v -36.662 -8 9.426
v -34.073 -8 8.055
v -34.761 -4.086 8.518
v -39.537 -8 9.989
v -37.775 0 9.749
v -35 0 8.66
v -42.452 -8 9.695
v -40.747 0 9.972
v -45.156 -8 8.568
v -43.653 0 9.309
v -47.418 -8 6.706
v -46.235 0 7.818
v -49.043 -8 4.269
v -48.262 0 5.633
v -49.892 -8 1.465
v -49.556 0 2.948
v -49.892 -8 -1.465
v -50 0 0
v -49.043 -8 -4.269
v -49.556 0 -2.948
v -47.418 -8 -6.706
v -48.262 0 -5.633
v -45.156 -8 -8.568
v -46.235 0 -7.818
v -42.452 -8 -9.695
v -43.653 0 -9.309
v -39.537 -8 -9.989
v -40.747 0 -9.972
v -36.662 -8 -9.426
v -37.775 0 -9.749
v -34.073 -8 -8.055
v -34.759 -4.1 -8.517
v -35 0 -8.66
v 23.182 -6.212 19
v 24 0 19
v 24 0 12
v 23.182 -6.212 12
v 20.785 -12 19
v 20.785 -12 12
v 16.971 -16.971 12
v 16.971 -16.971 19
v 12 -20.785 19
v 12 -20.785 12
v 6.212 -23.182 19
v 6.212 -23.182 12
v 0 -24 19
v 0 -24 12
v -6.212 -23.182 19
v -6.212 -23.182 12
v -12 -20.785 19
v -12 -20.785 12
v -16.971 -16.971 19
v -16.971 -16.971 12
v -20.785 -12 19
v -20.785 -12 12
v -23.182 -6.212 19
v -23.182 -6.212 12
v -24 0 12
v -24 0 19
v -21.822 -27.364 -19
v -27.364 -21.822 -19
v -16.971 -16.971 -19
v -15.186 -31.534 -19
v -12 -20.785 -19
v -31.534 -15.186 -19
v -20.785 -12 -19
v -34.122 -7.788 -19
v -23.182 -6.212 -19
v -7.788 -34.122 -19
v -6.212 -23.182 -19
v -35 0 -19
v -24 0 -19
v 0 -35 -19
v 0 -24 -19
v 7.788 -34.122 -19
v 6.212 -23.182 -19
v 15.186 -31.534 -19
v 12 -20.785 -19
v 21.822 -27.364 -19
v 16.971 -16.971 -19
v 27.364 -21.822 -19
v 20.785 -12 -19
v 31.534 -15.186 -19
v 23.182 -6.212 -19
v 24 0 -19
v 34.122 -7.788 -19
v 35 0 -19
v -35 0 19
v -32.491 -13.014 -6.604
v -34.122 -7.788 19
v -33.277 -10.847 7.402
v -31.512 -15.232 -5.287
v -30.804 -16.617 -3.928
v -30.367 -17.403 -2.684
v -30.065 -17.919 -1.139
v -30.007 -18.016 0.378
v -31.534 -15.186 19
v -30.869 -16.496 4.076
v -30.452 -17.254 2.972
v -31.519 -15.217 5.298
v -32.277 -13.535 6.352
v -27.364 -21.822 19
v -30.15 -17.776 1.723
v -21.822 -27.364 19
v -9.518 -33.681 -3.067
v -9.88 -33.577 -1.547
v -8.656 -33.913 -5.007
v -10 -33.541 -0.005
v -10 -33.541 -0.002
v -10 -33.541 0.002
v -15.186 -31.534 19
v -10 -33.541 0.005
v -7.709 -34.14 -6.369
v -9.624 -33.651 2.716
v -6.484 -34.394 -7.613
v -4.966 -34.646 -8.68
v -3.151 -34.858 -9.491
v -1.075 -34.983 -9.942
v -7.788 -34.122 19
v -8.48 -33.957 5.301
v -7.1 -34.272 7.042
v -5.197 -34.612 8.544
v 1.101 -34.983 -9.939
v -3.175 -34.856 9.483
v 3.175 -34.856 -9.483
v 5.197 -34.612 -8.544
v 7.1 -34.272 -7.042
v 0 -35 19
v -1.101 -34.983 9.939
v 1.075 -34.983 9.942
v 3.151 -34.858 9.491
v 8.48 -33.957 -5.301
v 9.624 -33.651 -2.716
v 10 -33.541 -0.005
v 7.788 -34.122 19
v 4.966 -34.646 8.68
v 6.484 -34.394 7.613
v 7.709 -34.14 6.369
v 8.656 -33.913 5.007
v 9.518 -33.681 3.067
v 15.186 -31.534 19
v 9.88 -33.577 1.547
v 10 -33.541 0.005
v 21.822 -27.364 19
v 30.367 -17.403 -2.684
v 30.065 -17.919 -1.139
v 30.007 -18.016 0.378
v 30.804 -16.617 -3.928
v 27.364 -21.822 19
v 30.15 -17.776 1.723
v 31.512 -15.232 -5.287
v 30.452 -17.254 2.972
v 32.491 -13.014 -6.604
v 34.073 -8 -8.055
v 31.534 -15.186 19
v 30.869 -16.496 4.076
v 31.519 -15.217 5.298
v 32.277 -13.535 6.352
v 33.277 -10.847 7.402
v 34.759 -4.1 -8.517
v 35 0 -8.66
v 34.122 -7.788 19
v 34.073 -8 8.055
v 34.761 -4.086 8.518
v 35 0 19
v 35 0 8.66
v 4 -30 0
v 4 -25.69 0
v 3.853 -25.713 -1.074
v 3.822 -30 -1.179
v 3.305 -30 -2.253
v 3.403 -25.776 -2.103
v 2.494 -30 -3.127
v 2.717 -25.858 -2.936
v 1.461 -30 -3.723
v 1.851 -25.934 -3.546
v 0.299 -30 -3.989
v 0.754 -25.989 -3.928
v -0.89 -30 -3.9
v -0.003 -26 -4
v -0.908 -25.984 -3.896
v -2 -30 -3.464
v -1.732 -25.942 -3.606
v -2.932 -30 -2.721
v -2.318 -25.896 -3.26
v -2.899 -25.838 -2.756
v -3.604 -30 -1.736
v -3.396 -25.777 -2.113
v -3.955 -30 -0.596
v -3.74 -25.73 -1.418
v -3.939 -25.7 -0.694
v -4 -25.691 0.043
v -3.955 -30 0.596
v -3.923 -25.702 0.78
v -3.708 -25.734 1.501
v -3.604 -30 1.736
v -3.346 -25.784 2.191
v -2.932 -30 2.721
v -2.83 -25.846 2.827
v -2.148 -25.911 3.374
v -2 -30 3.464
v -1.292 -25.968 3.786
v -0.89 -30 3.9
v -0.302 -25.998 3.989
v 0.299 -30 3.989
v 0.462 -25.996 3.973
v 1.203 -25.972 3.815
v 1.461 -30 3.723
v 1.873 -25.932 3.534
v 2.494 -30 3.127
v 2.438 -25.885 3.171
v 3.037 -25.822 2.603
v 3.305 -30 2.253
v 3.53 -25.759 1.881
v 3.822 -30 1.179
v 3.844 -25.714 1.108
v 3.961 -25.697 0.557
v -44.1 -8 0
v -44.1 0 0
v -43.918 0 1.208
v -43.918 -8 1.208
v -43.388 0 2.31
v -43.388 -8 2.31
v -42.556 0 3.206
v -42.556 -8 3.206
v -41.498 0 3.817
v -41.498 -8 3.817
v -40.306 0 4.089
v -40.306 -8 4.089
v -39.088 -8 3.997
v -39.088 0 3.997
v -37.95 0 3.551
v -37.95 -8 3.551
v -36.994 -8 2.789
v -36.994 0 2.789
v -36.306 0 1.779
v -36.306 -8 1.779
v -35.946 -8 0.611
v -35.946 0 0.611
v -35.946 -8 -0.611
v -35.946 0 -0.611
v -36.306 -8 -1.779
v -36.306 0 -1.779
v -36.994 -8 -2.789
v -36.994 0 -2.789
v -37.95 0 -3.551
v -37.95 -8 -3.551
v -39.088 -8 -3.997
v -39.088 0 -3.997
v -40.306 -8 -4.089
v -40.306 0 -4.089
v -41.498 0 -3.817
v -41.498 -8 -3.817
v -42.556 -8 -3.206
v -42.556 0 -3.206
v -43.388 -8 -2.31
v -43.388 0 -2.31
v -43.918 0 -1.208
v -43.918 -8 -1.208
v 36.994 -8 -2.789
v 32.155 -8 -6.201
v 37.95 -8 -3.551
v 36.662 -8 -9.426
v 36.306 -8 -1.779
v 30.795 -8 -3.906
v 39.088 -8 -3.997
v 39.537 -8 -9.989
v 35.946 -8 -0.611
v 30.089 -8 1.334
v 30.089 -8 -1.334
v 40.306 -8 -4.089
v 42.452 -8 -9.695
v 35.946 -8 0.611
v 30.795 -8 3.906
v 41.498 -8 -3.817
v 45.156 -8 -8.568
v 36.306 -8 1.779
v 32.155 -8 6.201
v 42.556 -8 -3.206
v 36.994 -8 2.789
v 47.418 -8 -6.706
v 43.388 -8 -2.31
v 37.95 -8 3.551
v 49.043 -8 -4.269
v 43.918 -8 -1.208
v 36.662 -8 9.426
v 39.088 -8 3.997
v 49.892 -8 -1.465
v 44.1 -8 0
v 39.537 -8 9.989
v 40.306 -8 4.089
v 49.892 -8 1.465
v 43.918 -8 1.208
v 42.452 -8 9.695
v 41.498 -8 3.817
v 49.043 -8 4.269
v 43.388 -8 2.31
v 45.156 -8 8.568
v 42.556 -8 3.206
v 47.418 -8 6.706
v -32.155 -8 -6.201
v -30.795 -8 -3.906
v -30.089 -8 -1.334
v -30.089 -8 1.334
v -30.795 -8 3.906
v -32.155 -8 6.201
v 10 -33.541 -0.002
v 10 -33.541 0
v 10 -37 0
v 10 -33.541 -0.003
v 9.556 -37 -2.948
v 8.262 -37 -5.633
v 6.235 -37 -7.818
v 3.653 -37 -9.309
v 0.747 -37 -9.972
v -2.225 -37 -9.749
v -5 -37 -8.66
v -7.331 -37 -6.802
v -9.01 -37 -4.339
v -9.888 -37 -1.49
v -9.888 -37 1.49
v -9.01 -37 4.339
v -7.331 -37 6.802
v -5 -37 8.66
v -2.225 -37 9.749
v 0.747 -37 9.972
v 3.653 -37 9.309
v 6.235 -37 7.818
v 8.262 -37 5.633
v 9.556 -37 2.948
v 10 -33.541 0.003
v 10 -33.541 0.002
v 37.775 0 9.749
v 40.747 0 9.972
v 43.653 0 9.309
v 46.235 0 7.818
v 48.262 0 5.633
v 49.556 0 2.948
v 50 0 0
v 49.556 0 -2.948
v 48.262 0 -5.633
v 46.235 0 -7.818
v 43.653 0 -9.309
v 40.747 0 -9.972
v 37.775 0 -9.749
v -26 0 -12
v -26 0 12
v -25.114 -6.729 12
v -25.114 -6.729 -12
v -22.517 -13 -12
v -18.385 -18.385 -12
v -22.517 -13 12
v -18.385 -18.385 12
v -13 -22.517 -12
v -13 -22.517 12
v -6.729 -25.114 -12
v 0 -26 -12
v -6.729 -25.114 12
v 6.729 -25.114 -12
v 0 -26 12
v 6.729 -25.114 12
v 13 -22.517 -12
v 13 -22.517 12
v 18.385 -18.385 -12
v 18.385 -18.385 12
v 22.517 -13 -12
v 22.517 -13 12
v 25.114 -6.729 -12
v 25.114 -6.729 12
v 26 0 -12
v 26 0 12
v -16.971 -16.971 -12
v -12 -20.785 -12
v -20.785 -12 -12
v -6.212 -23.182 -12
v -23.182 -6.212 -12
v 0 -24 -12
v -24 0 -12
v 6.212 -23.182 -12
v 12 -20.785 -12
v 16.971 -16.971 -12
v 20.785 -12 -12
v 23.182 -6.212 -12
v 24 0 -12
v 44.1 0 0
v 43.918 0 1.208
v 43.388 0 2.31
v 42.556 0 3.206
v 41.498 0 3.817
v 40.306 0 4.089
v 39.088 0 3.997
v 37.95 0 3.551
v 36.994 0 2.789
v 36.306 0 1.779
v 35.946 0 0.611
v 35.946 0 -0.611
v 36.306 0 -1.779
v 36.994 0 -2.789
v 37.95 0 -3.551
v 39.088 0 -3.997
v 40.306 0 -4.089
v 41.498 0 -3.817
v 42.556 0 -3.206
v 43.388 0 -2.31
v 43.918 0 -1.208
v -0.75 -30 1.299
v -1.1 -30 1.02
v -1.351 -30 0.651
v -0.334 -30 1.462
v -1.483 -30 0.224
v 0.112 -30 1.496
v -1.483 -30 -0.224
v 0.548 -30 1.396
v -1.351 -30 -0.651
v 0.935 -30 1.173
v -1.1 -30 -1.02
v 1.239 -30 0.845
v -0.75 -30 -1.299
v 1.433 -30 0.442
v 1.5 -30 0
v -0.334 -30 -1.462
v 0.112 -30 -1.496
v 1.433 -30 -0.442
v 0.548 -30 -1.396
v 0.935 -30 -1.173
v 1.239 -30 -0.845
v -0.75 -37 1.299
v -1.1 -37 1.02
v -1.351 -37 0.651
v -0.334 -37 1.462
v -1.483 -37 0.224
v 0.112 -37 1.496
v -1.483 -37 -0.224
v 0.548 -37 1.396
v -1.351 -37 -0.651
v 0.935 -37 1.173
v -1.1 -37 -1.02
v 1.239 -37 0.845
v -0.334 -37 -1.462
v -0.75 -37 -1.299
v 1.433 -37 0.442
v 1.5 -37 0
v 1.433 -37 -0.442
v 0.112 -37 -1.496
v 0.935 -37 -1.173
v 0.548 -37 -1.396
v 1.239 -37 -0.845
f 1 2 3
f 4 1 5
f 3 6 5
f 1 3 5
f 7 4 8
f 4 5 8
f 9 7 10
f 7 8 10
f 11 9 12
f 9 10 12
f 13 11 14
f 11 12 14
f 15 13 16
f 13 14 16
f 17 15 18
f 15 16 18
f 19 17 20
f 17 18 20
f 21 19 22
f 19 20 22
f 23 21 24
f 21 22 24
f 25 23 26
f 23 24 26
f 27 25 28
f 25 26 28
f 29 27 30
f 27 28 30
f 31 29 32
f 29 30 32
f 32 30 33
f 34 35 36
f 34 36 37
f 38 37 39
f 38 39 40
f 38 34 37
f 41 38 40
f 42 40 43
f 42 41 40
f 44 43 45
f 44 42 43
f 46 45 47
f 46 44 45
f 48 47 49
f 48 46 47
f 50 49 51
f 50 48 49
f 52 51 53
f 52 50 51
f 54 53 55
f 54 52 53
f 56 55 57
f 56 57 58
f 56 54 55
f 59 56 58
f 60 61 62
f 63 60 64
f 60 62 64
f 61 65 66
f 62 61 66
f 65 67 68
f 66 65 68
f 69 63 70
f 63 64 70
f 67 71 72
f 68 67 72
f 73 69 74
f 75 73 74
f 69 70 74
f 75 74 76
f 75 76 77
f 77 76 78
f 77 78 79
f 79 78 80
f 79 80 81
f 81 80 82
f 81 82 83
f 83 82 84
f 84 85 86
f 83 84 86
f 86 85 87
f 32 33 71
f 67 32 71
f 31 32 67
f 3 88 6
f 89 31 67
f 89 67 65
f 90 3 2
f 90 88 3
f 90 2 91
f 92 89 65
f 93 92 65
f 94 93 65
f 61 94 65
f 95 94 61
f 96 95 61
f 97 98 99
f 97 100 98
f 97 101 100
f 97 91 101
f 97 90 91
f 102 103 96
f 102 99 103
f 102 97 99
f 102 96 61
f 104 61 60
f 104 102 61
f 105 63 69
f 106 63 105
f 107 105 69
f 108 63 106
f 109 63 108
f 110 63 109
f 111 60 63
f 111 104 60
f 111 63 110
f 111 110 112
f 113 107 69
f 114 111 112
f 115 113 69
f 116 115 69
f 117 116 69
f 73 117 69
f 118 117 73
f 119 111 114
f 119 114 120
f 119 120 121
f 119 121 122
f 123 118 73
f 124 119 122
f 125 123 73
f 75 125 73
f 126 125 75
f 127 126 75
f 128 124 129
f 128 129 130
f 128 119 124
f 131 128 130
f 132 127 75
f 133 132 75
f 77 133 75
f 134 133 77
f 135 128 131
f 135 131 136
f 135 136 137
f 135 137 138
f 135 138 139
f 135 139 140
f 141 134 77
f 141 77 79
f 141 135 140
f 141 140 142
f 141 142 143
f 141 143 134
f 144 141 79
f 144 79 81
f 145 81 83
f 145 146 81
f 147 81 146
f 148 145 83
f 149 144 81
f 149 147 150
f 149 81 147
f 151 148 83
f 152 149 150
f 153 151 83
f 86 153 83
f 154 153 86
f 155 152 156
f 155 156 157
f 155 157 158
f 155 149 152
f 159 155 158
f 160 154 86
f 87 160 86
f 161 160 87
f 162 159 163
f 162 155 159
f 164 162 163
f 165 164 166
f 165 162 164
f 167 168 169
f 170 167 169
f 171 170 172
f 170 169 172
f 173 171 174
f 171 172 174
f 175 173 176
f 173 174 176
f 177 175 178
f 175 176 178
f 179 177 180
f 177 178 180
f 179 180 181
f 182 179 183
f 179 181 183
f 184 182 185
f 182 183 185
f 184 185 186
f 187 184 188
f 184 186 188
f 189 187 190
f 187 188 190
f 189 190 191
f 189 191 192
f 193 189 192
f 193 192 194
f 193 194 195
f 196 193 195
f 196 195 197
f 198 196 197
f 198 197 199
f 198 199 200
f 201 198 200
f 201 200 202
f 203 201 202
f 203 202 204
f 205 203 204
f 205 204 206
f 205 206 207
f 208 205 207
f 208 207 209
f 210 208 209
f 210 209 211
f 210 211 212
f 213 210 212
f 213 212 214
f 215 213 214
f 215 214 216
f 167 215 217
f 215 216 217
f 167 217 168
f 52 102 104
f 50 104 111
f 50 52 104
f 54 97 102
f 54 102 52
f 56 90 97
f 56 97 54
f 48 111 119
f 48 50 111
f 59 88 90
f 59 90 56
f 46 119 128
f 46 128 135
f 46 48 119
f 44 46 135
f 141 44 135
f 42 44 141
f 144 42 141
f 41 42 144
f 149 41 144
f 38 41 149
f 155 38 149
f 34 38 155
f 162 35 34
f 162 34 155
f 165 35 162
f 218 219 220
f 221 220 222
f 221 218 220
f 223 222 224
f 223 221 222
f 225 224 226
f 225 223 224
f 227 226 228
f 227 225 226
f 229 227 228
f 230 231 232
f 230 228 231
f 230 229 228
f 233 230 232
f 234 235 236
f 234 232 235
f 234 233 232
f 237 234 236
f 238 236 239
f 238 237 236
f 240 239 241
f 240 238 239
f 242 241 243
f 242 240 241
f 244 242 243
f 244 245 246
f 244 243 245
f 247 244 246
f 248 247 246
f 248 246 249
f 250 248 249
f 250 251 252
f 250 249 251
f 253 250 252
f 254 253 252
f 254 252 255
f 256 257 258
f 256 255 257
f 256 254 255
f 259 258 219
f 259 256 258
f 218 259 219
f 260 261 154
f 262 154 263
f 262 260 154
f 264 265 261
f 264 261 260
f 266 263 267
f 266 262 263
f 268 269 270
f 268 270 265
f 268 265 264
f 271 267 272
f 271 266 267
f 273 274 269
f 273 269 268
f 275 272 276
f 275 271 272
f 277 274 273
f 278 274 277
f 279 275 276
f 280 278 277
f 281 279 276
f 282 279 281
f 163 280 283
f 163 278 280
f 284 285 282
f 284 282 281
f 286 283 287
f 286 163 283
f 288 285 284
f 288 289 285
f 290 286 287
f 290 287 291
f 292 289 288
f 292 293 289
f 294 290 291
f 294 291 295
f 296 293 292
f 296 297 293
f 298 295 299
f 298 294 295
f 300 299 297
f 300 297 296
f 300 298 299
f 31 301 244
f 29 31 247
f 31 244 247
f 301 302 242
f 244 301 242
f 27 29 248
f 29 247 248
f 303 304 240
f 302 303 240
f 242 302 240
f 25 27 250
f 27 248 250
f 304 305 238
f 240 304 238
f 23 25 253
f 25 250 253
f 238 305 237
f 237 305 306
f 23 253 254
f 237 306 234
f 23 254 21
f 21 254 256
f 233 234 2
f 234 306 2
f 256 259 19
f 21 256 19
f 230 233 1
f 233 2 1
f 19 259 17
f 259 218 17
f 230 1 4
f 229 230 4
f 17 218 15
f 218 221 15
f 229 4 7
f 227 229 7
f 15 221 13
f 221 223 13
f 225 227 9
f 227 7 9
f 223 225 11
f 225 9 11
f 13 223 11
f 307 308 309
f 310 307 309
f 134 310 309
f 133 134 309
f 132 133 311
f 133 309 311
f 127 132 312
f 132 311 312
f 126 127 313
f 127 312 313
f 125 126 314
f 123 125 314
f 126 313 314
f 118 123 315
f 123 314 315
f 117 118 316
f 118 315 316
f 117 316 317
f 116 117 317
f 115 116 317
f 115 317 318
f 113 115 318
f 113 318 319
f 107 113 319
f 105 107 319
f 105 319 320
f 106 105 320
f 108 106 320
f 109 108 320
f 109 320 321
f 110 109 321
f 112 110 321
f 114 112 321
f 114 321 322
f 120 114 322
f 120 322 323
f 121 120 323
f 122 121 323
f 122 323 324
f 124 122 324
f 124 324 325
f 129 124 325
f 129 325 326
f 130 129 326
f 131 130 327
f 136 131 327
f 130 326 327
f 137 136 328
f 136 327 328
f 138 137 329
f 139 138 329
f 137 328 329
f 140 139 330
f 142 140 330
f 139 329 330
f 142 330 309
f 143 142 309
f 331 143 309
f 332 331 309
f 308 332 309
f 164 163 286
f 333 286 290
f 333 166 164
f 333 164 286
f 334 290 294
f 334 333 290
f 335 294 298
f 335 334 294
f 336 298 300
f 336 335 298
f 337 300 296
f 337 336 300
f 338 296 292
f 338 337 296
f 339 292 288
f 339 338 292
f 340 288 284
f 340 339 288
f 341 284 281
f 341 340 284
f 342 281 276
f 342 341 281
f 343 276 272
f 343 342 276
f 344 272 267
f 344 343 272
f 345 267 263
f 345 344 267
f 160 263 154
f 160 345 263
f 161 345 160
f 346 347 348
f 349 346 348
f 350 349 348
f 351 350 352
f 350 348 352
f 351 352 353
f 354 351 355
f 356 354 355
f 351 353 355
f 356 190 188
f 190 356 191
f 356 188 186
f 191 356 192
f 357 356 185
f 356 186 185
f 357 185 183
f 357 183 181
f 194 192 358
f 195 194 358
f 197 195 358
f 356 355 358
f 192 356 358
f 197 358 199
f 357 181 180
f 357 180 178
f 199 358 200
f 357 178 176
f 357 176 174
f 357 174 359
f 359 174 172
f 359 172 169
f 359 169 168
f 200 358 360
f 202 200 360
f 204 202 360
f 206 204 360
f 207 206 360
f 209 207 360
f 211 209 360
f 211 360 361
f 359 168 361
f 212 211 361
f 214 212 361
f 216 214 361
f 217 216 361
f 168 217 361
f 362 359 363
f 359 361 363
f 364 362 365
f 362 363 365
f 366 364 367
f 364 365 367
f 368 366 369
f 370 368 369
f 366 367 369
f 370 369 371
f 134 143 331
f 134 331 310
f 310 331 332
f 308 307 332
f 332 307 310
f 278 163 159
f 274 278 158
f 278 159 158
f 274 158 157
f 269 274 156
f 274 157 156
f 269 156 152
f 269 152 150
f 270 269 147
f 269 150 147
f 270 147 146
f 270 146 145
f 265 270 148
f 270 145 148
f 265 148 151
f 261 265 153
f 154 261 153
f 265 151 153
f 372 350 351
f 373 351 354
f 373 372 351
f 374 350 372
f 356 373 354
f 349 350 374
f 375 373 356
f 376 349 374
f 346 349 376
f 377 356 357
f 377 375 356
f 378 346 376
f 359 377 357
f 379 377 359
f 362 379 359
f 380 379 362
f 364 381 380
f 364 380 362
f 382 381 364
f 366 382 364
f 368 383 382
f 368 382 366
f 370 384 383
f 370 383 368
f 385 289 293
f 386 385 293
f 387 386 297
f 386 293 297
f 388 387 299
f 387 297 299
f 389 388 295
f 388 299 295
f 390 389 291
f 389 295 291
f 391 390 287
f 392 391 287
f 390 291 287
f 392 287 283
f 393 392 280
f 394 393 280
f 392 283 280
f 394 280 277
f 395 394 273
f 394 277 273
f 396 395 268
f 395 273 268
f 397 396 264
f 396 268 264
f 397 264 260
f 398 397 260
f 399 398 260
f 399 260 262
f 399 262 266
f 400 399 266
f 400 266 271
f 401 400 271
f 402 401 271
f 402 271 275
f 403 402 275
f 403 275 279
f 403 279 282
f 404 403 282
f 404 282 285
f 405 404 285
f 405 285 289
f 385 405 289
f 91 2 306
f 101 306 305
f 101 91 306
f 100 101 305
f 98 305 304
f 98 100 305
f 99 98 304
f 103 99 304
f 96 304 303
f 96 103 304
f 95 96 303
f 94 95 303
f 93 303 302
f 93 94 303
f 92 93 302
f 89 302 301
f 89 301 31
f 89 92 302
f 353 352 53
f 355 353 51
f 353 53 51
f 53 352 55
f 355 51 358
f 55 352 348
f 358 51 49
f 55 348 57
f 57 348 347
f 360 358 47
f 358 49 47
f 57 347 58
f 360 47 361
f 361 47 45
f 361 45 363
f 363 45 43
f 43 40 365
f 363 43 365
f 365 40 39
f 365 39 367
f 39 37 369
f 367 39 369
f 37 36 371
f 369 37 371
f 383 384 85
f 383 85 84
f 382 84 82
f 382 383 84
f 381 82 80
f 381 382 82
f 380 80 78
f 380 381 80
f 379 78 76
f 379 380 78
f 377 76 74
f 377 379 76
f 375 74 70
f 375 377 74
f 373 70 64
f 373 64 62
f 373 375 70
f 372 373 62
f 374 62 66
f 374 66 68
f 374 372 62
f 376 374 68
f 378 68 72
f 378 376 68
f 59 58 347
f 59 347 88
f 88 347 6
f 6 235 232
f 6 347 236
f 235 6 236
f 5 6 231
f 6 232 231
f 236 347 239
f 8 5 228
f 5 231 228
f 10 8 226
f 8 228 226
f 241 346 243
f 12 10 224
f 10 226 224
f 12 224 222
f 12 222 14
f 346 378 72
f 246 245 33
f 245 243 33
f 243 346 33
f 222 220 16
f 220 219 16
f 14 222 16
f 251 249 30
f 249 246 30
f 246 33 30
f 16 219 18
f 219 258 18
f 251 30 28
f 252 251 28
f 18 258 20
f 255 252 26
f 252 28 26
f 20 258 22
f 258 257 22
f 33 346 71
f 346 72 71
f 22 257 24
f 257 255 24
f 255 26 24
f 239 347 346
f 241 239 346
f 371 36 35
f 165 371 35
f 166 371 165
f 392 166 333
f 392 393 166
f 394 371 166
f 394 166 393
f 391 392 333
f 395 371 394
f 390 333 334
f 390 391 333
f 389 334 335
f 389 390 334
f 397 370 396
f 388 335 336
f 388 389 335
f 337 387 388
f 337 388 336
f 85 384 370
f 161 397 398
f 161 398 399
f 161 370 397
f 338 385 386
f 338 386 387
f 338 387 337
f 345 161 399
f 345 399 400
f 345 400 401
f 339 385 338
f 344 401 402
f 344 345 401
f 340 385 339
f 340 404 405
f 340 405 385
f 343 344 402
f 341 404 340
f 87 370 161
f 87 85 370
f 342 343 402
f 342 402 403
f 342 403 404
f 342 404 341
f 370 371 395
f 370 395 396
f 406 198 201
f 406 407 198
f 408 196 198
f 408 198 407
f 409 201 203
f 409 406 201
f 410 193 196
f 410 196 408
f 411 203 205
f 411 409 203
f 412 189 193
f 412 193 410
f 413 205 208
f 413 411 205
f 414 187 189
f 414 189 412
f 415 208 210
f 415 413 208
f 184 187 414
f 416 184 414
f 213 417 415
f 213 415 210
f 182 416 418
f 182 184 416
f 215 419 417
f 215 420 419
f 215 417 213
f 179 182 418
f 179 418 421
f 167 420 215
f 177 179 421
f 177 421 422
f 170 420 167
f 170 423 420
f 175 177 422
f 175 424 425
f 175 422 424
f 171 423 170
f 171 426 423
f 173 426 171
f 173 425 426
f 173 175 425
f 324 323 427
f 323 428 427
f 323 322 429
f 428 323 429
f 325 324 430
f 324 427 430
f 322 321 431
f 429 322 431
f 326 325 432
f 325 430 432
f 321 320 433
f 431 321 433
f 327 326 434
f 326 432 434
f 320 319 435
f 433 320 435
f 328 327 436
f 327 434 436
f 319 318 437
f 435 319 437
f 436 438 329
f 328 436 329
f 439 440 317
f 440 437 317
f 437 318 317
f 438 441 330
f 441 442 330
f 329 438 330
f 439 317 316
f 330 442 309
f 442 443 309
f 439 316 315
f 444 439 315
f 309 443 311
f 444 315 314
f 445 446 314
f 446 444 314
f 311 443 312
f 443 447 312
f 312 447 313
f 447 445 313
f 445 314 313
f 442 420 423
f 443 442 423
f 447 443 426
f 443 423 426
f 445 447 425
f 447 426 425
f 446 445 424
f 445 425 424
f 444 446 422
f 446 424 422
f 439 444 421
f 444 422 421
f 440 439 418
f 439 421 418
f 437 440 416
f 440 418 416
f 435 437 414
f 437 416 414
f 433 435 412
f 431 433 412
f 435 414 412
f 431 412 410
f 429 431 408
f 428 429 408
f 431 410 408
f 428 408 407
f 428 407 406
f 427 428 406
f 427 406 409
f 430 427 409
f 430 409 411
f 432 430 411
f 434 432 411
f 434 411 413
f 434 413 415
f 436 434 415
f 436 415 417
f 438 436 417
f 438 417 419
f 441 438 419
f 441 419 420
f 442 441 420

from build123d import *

# Parameters (mm, degrees)
EXTRUDE_2_DEPTH     = 19
SKETCH_2_R          = 10
EXTRUDE_3_DEPTH     = 40
SKETCH_3_R          = 10
CUT_EXTRUDE_1_DEPTH = 32
SKETCH_4_R          = 4.1
CUT_EXTRUDE_2_DEPTH = 9.0000001
EXTRUDE_START       = -37
SKETCH_5_R          = 10
SKETCH_5_R_2        = 1.5
EXTRUDE_4_DEPTH     = 3.45898
SKETCH_5_4_R        = 1.5
CUT_EXTRUDE_3_DEPTH = 38.0000001
CUT_EXTRUDE_4_DEPTH = 12
SKETCH_6_R          = 4
CUT_EXTRUDE_5_DEPTH = 30


with BuildPart() as part:
    # Эскиз1 → Бобышка-Вытянуть2 (new body, symmetric)
    with BuildSketch(Plane.XY):
        with BuildLine():
            Line((35, 0), (26, 0))
            ThreePointArc((26, 0), (0, -26), (-26, 0))
            Line((-26, 0), (-35, 0))
            ThreePointArc((-35, 0), (0, -35), (35, 0))
        make_face()
        with BuildLine():
            Line((26, 0), (24, 0))
            ThreePointArc((24, 0), (0, -24), (-24, 0))
            Line((-24, 0), (-26, 0))
            ThreePointArc((-26, 0), (0, -26), (26, 0))
        make_face()
    extrude(amount=EXTRUDE_2_DEPTH, both=True)

    # Эскиз2 → Бобышка-Вытянуть3 (add)
    with BuildSketch(Plane(origin=(0, 0, 0), x_dir=(1, 0, 0), z_dir=(0, 1, 0))):
        with Locations((40, 0)):
            Circle(SKETCH_2_R)
    extrude_3 = extrude(amount=-EXTRUDE_3_DEPTH)

    # Эскиз3 → Вырез-Вытянуть1 (cut)
    with BuildSketch(Plane.XZ.offset(40)):
        with Locations((40, 0)):
            Circle(SKETCH_3_R)
    cut_extrude_1 = extrude(amount=-CUT_EXTRUDE_1_DEPTH, mode=Mode.SUBTRACT)

    # Эскиз4 → Вырез-Вытянуть2 (cut, through all)
    with BuildSketch(Plane.XZ.offset(8)):
        with Locations((40, 0)):
            Circle(SKETCH_4_R)
    cut_extrude_2 = extrude(amount=-CUT_EXTRUDE_2_DEPTH, mode=Mode.SUBTRACT)

    # Зеркальное отражение1: Бобышка-Вытянуть3, Вырез-Вытянуть1, Вырез-Вытянуть2 across plane
    add(extrude_3.mirror(Plane(origin=(0, 0, 0), x_dir=(0, 0, 1), z_dir=(1, 0, 0))))
    add(cut_extrude_1.mirror(Plane(origin=(0, 0, 0), x_dir=(0, 0, 1), z_dir=(1, 0, 0))), mode=Mode.SUBTRACT)
    add(cut_extrude_2.mirror(Plane(origin=(0, 0, 0), x_dir=(0, 0, 1), z_dir=(1, 0, 0))), mode=Mode.SUBTRACT)

    # Эскиз5 → Бобышка-Вытянуть4 (add)
    with BuildSketch(Plane(origin=(0, 0, 0), x_dir=(1, 0, 0), z_dir=(0, 1, 0)).offset(EXTRUDE_START)):
        Circle(SKETCH_5_R)
        Circle(SKETCH_5_R_2, mode=Mode.SUBTRACT)
        Circle(SKETCH_5_R_2)
    extrude(amount=EXTRUDE_4_DEPTH)

    # Эскиз5<4> → Вырез-Вытянуть3 (cut, through all)
    with BuildSketch(Plane(origin=(0, 0, 0), x_dir=(1, 0, 0), z_dir=(0, 1, 0))):
        Circle(SKETCH_5_4_R)
    extrude(amount=-CUT_EXTRUDE_3_DEPTH, mode=Mode.SUBTRACT)

    # Эскиз1<4> → Вырез-Вытянуть4 (cut, symmetric)
    with BuildSketch(Plane.XY):
        with BuildLine():
            ThreePointArc((-24, 0), (0, 24), (24, 0))
            Line((24, 0), (26, 0))
            ThreePointArc((26, 0), (0, 26), (-26, 0))
            Line((-26, 0), (-24, 0))
        make_face()
        with BuildLine():
            Line((26, 0), (24, 0))
            ThreePointArc((24, 0), (0, -24), (-24, 0))
            Line((-24, 0), (-26, 0))
            ThreePointArc((-26, 0), (0, -26), (26, 0))
        make_face()
    extrude(amount=CUT_EXTRUDE_4_DEPTH, both=True, mode=Mode.SUBTRACT)

    # Эскиз6 → Вырез-Вытянуть5 (cut)
    with BuildSketch(Plane(origin=(0, 0, 0), x_dir=(1, 0, 0), z_dir=(0, 1, 0))):
        Circle(SKETCH_6_R)
    extrude(amount=-CUT_EXTRUDE_5_DEPTH, mode=Mode.SUBTRACT)


solid = part.part
